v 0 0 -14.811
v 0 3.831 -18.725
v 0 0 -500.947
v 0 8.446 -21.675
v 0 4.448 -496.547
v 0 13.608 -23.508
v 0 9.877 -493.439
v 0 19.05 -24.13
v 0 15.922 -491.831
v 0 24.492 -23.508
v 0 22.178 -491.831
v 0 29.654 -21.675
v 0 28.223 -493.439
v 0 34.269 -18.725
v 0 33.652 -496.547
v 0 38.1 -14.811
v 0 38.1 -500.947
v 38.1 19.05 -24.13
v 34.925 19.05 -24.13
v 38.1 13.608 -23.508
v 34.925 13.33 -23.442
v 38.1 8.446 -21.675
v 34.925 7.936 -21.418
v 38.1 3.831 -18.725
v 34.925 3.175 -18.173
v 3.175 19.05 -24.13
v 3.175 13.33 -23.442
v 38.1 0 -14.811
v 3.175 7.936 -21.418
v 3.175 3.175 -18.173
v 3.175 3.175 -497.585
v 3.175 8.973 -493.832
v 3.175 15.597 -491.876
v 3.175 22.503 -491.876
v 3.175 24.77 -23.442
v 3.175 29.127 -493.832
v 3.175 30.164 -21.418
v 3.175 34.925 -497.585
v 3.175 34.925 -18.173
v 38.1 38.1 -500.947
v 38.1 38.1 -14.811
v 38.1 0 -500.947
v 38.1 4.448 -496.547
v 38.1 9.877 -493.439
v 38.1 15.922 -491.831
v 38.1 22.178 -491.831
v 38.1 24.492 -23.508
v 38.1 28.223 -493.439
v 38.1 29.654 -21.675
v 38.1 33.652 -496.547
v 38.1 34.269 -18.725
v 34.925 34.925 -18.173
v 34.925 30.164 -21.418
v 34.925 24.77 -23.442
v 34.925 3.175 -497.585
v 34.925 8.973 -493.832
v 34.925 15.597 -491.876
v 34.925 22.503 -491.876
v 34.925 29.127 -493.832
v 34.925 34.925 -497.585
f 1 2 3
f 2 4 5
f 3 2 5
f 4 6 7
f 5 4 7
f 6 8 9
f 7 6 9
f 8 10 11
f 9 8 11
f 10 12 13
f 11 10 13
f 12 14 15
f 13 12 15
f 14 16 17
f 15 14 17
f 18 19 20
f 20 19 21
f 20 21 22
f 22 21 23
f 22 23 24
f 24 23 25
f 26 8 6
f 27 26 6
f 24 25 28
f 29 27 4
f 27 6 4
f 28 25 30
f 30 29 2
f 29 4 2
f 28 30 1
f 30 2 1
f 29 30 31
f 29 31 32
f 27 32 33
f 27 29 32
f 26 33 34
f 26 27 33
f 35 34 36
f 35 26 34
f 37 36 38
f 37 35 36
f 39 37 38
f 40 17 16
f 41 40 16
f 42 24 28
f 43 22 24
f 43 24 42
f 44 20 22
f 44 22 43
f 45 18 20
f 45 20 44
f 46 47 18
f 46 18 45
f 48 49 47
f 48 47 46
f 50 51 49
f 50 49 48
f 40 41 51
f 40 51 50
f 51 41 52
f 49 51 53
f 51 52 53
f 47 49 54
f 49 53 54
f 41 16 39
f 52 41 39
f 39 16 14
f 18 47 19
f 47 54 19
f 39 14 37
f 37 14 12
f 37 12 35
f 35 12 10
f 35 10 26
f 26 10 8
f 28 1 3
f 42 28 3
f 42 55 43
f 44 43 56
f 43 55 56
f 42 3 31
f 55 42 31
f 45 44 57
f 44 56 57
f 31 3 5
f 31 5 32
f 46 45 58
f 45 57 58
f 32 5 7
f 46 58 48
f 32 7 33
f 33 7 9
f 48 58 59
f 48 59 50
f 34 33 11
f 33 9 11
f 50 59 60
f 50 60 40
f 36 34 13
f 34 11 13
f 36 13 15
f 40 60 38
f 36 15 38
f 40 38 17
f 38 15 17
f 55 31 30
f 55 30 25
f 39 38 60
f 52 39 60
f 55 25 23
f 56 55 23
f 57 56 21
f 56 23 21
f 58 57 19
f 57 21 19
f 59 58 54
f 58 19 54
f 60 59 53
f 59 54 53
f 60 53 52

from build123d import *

# Parameters (mm, degrees)
BOSS_EXTRUDE1_DEPTH = 38.1
SKETCH2_W           = 31.75
SKETCH2_H           = 31.75
CUT_EXTRUDE1_DEPTH  = 504.835943665


with BuildPart() as part:
    # Sketch1 → Boss-Extrude1 (new body)
    with BuildSketch(Plane(origin=(0, 0, 0), x_dir=(0, 0, -1), z_dir=(1, 0, 0))):
        with BuildLine():
            ThreePointArc((24.13, 19.05), (21.675298243, 8.446305074), (14.810617813, 0))
            Line((14.810617813, 0), (500.946542187, 0))
            ThreePointArc((500.946542187, 0), (491.62716, 19.05), (500.946542187, 38.1))
            Line((500.946542187, 38.1), (14.810617813, 38.1))
            ThreePointArc((14.810617813, 38.1), (21.675298243, 29.653694926), (24.13, 19.05))
        make_face()
    extrude(amount=BOSS_EXTRUDE1_DEPTH)

    # Sketch2 → Cut-Extrude1 (cut, through all)
    with BuildSketch(Plane.XY):
        with Locations((19.05, 19.05)):
            Rectangle(SKETCH2_W, SKETCH2_H)
    extrude(amount=-CUT_EXTRUDE1_DEPTH, mode=Mode.SUBTRACT)


solid = part.part
